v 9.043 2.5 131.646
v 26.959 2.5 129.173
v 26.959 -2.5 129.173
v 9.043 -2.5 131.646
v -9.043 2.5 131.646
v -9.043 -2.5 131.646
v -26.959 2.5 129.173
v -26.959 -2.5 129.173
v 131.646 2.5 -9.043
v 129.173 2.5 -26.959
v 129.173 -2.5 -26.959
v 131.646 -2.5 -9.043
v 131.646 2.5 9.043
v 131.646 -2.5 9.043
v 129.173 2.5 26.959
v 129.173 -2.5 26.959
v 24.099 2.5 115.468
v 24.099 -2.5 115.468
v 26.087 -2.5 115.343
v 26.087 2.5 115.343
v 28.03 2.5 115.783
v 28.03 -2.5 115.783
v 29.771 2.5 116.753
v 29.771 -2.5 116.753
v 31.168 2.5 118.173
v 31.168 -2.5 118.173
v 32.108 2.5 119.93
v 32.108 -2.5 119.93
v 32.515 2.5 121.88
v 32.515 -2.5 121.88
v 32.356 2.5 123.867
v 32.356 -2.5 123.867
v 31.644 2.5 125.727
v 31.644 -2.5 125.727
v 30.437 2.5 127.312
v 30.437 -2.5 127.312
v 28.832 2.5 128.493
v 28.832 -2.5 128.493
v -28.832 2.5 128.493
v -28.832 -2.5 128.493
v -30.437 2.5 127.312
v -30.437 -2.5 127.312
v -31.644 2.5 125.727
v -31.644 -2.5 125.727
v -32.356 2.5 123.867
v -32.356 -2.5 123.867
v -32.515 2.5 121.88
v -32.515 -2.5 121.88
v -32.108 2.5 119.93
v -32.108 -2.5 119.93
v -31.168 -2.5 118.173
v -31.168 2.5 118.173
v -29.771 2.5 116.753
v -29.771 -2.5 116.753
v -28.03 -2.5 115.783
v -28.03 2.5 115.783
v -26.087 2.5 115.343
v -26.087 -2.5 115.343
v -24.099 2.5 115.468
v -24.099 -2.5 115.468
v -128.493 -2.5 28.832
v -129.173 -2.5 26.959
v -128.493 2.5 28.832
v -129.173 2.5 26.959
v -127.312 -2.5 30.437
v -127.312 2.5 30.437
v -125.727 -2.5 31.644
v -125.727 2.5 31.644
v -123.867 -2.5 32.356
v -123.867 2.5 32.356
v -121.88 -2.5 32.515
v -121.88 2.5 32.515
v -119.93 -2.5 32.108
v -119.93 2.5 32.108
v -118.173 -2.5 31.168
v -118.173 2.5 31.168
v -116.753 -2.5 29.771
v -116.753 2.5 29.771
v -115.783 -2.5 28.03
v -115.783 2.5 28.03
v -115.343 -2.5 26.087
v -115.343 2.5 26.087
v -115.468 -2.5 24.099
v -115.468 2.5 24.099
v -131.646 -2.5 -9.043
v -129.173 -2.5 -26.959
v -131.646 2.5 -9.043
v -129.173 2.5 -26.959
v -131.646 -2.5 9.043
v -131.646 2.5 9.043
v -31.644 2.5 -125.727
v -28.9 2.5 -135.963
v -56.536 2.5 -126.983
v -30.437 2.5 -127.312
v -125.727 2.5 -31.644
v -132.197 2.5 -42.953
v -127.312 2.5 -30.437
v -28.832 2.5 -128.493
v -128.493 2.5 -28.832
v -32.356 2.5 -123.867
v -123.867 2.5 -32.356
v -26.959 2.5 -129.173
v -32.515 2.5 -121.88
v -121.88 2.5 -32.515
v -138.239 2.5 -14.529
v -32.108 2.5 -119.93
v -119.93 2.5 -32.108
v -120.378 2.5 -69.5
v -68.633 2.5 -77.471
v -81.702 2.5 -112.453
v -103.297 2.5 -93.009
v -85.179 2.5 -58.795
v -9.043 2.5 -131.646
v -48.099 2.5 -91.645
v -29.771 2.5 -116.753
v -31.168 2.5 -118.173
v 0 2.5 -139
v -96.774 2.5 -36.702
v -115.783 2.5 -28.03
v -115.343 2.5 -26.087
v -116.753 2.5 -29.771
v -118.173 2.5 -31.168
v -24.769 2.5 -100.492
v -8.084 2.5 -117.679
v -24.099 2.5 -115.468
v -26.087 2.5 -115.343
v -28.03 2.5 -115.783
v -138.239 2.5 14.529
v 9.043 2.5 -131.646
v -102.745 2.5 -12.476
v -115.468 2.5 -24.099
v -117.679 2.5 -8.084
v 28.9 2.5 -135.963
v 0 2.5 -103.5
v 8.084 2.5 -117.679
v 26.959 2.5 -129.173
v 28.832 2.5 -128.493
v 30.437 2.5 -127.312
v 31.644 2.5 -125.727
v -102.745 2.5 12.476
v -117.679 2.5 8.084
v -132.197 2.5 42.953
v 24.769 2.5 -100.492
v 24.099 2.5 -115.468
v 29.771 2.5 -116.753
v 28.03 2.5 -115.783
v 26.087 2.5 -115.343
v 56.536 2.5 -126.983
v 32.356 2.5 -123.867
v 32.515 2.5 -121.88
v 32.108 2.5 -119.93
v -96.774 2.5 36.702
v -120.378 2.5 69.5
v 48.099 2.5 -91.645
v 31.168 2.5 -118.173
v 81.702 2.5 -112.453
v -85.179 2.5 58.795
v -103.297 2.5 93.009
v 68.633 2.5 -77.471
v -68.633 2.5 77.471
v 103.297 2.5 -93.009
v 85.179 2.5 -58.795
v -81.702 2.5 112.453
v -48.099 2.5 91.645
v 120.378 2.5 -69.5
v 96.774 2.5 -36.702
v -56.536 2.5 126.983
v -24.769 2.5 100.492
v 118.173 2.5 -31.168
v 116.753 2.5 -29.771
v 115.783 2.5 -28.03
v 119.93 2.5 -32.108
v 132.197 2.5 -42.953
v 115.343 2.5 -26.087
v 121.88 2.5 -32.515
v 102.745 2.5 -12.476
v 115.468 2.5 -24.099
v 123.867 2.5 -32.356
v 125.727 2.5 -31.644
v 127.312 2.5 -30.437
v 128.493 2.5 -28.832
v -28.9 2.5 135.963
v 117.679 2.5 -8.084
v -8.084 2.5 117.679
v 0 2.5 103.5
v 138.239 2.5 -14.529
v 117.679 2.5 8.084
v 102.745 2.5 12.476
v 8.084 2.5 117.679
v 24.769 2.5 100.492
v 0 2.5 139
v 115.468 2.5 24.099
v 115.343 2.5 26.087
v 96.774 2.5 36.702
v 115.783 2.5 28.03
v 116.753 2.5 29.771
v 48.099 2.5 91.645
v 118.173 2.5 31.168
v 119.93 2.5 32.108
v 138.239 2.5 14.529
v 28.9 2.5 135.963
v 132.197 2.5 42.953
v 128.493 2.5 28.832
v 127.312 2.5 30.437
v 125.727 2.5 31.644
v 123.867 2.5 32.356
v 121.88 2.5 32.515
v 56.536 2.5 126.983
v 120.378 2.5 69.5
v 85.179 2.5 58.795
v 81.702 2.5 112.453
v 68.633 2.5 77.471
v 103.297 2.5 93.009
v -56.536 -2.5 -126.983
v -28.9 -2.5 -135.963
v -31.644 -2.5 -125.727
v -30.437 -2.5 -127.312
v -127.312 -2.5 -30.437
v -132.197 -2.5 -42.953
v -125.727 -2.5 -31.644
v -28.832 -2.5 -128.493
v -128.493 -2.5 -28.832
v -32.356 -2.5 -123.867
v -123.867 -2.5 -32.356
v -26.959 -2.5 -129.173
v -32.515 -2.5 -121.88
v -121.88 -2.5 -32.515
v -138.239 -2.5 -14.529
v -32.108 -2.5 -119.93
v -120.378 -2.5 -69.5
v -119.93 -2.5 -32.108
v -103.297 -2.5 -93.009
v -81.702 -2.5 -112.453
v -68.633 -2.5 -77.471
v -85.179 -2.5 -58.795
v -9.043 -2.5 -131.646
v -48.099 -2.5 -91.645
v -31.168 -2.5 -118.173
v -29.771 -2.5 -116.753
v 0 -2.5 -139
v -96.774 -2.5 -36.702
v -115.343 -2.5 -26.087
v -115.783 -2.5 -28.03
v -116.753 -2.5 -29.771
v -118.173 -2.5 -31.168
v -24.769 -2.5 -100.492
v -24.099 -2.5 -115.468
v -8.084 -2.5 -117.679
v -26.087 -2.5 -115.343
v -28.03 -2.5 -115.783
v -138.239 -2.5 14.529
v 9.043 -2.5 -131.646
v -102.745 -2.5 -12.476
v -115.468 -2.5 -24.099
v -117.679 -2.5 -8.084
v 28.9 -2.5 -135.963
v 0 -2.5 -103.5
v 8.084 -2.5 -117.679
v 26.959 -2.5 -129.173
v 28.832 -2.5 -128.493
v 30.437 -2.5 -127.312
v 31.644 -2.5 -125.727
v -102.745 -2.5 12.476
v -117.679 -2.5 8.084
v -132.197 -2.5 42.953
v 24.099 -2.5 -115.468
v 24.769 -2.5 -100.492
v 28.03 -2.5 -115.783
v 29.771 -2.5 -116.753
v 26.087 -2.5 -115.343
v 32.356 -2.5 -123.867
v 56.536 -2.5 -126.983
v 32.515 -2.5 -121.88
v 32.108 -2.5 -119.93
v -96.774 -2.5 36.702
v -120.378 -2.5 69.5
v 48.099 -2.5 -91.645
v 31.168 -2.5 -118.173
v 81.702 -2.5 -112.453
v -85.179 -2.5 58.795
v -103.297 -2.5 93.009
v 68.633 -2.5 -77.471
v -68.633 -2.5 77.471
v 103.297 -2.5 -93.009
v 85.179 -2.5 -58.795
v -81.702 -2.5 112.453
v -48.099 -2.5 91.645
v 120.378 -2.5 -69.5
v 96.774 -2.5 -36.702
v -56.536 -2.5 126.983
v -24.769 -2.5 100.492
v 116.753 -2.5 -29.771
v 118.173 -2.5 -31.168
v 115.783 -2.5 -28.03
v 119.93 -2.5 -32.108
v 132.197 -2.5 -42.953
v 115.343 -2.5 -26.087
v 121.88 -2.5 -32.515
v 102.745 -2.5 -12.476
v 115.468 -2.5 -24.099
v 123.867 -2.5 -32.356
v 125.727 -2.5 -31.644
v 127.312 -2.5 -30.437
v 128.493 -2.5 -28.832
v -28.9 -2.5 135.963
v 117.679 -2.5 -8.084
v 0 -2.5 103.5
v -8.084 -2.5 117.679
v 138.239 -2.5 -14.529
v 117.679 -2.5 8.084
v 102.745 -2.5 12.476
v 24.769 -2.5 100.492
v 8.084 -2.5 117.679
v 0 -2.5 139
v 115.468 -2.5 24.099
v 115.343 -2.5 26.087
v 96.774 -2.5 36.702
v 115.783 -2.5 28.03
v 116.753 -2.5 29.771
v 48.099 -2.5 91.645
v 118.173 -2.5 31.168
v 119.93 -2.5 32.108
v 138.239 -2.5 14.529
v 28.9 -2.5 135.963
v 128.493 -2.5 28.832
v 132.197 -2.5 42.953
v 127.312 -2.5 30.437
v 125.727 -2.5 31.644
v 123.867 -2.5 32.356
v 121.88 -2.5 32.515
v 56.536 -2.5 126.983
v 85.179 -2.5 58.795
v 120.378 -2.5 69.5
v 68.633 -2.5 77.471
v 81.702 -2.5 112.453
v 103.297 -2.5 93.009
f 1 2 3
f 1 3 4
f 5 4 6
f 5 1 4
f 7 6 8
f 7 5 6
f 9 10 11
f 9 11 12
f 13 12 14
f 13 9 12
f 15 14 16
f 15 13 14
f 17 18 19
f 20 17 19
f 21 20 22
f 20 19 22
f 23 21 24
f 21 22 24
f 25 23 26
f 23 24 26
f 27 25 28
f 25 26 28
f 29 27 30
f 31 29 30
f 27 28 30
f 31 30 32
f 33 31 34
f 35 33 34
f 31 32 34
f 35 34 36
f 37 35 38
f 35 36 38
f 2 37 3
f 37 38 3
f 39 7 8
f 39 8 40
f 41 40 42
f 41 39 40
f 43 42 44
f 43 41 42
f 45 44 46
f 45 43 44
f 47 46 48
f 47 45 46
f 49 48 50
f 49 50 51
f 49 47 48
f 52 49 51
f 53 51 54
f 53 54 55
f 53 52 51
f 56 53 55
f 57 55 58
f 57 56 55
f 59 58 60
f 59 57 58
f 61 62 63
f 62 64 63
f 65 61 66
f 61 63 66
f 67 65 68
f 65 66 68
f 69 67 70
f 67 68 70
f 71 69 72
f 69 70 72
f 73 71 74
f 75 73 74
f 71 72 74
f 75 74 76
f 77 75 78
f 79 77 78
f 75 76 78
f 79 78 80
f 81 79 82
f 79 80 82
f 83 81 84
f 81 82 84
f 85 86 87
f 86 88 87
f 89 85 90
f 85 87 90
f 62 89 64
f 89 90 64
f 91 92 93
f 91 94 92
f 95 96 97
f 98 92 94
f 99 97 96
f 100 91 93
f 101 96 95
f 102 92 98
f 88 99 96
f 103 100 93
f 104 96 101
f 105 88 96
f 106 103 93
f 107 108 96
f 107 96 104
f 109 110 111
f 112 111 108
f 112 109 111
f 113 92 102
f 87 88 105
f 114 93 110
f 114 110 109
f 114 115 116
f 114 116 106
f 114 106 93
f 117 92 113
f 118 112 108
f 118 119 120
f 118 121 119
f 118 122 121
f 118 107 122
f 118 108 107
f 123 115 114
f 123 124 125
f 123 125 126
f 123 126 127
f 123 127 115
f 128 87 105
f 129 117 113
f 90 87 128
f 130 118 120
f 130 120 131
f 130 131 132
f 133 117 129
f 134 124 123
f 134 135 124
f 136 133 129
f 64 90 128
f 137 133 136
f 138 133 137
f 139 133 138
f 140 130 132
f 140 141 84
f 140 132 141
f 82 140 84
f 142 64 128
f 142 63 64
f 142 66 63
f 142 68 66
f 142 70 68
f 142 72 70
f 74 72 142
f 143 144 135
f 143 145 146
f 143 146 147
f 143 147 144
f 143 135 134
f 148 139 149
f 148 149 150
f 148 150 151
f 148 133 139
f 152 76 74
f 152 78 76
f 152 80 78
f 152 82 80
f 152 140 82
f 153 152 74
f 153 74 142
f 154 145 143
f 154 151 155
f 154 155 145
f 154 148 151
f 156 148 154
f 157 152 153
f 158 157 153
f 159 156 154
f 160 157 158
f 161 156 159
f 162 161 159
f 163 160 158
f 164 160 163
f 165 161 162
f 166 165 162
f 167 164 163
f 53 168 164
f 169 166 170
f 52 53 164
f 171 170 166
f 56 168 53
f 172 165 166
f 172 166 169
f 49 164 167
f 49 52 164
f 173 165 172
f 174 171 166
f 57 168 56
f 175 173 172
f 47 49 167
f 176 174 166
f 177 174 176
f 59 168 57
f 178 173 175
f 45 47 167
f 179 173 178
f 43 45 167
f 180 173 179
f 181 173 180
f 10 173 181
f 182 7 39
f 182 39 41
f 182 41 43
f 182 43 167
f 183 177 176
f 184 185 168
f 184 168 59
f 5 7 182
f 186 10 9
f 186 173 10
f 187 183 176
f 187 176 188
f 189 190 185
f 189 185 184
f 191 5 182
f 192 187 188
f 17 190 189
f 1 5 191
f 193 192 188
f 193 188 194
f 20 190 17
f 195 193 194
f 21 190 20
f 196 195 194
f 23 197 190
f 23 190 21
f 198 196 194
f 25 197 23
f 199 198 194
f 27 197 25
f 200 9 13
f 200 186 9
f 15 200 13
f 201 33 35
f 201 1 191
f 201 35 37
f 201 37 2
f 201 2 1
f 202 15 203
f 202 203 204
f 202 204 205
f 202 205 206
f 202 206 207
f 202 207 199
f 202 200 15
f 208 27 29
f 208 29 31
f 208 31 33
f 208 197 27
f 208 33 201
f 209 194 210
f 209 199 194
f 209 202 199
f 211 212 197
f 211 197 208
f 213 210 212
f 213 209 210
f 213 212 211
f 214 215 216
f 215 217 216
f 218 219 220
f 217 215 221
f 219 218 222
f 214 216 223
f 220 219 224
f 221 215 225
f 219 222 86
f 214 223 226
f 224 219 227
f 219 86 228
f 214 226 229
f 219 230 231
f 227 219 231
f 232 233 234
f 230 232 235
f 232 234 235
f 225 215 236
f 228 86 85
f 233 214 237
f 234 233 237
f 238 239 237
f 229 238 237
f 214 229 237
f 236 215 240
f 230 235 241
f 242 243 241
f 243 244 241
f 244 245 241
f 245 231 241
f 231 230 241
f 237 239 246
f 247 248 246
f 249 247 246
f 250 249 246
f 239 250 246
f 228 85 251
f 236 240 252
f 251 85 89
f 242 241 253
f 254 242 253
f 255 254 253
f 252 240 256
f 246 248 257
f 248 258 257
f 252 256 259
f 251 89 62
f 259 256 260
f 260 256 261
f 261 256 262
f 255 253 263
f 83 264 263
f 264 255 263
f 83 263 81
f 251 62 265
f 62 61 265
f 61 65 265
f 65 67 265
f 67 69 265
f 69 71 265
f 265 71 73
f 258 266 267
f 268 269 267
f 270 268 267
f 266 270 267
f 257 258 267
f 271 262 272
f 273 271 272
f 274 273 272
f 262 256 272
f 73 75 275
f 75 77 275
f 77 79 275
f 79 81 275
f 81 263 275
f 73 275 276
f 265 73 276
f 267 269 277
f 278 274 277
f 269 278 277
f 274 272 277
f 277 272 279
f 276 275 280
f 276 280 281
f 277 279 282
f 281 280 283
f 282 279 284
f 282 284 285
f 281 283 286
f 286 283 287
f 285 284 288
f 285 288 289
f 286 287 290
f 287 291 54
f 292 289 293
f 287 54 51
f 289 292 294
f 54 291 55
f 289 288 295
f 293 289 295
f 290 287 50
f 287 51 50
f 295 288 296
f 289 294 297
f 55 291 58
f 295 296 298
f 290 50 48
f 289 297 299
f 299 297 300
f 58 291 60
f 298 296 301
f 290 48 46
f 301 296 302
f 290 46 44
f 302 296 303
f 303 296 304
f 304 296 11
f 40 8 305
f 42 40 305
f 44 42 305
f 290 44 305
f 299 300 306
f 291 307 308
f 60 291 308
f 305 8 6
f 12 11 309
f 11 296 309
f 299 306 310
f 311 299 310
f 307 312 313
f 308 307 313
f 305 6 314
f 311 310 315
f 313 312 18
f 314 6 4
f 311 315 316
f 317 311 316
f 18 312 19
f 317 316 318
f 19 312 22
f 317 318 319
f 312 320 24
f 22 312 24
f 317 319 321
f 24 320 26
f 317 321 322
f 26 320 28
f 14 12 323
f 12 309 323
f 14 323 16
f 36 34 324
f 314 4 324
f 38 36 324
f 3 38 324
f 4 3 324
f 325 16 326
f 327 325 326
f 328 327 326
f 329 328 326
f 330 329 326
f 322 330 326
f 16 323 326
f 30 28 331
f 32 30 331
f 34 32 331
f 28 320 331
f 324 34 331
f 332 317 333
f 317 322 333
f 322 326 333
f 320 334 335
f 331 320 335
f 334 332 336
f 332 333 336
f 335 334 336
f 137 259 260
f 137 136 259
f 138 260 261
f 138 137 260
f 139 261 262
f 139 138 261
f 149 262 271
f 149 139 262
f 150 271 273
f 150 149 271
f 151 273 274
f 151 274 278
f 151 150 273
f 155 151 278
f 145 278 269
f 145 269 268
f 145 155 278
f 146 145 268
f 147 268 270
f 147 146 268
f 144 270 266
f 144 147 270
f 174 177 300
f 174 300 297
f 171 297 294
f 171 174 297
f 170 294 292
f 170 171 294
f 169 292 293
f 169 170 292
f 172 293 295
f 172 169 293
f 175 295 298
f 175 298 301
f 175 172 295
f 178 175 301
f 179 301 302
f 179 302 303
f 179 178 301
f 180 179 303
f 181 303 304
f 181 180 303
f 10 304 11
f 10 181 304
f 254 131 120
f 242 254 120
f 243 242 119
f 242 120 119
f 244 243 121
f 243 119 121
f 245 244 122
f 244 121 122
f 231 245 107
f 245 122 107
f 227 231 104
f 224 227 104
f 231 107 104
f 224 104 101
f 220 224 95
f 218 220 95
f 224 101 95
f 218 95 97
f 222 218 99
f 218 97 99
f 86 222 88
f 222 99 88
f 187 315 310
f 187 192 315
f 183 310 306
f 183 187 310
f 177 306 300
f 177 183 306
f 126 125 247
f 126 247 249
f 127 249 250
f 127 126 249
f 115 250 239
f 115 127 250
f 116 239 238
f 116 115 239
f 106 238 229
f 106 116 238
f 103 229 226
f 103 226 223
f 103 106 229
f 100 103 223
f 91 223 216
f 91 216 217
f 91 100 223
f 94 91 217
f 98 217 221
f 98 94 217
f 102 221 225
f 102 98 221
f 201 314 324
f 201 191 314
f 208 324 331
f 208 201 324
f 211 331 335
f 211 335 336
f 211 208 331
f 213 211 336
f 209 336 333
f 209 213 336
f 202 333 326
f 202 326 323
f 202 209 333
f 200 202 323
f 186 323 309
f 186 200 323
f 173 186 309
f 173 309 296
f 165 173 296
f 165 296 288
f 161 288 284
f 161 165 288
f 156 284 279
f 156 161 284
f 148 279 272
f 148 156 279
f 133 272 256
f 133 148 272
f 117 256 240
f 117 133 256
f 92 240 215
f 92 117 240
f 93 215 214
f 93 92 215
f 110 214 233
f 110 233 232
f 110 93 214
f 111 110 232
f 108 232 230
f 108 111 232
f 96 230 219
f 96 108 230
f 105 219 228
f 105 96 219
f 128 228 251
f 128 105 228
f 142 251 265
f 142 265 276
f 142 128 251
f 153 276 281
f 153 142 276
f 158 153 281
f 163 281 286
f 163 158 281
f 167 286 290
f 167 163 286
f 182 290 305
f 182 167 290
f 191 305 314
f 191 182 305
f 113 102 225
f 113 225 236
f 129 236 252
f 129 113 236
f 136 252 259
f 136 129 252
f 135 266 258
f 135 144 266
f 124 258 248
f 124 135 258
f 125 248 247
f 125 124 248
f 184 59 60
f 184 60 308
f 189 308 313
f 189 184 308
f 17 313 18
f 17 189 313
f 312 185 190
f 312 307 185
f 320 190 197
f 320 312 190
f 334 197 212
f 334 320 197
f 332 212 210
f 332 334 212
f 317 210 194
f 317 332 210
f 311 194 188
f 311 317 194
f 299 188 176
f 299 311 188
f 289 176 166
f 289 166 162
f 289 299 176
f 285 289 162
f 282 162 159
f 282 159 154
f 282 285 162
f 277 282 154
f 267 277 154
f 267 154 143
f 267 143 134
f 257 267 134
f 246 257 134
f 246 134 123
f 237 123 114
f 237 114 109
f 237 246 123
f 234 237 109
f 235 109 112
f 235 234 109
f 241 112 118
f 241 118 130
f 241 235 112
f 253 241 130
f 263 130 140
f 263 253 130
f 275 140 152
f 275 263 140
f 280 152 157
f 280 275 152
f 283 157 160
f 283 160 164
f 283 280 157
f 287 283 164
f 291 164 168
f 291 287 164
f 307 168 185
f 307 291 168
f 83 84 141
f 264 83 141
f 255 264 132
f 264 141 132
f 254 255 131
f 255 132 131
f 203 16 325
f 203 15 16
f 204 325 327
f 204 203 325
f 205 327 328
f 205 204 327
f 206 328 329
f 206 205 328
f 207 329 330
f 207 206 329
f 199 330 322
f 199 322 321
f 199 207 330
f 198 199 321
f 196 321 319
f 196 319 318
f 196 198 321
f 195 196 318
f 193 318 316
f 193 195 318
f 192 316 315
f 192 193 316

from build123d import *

# Parameters (mm, degrees)
SCHIZZO1_R                   = 139
SCHIZZO1_R_2                 = 103.5
ESTRUSIONE_ESTRUSIONE1_DEPTH = 2.5


with BuildPart() as part:
    # Schizzo1 → Estrusione-Estrusione1 (new, symmetric)
    with BuildSketch(Plane(origin=(0, 0, 0), x_dir=(1, 0, 0), z_dir=(0, 1, 0))):
        with Locations(Location((0, 0, 0), (0, 0, 270))):
            Circle(SCHIZZO1_R)
        with Locations(Location((0, 0, 0), (0, 0, 270))):
            Circle(SCHIZZO1_R_2, mode=Mode.SUBTRACT)
        with BuildLine():
            ThreePointArc((-115.468480571, 24.098722638), (-120.890722726, 32.381191474), (-129.173191562, 26.958949319))
            ThreePointArc((-129.173191562, 26.958949319), (-131.956426015, 0), (-129.173191562, -26.958949319))
            ThreePointArc((-129.173191562, -26.958949319), (-120.890722726, -32.381191474), (-115.468480571, -24.098722638))
            ThreePointArc((-115.468480571, -24.098722638), (-117.956426015, 0), (-115.468480571, 24.098722638))
        make_face(mode=Mode.SUBTRACT)
        with BuildLine():
            ThreePointArc((-24.098722638, 115.468480571), (-32.381191474, 120.890722726), (-26.958949319, 129.173191562))
            ThreePointArc((-26.958949319, 129.173191562), (0, 131.956426015), (26.958949319, 129.173191562))
            ThreePointArc((26.958949319, 129.173191562), (32.381191474, 120.890722726), (24.098722638, 115.468480571))
            ThreePointArc((24.098722638, 115.468480571), (0, 117.956426015), (-24.098722638, 115.468480571))
        make_face(mode=Mode.SUBTRACT)
        with BuildLine():
            ThreePointArc((115.468480571, 24.098722638), (120.890722726, 32.381191474), (129.173191562, 26.958949319))
            ThreePointArc((129.173191562, 26.958949319), (131.956426015, 0), (129.173191562, -26.958949319))
            ThreePointArc((129.173191562, -26.958949319), (120.890722726, -32.381191474), (115.468480571, -24.098722638))
            ThreePointArc((115.468480571, -24.098722638), (117.956426015, 0), (115.468480571, 24.098722638))
        make_face(mode=Mode.SUBTRACT)
        with BuildLine():
            ThreePointArc((24.098722638, -115.468480571), (32.381191474, -120.890722726), (26.958949319, -129.173191562))
            ThreePointArc((26.958949319, -129.173191562), (0, -131.956426015), (-26.958949319, -129.173191562))
            ThreePointArc((-26.958949319, -129.173191562), (-32.381191474, -120.890722726), (-24.098722638, -115.468480571))
            ThreePointArc((-24.098722638, -115.468480571), (0, -117.956426015), (24.098722638, -115.468480571))
        make_face(mode=Mode.SUBTRACT)
    extrude(amount=ESTRUSIONE_ESTRUSIONE1_DEPTH, both=True)


solid = part.part
